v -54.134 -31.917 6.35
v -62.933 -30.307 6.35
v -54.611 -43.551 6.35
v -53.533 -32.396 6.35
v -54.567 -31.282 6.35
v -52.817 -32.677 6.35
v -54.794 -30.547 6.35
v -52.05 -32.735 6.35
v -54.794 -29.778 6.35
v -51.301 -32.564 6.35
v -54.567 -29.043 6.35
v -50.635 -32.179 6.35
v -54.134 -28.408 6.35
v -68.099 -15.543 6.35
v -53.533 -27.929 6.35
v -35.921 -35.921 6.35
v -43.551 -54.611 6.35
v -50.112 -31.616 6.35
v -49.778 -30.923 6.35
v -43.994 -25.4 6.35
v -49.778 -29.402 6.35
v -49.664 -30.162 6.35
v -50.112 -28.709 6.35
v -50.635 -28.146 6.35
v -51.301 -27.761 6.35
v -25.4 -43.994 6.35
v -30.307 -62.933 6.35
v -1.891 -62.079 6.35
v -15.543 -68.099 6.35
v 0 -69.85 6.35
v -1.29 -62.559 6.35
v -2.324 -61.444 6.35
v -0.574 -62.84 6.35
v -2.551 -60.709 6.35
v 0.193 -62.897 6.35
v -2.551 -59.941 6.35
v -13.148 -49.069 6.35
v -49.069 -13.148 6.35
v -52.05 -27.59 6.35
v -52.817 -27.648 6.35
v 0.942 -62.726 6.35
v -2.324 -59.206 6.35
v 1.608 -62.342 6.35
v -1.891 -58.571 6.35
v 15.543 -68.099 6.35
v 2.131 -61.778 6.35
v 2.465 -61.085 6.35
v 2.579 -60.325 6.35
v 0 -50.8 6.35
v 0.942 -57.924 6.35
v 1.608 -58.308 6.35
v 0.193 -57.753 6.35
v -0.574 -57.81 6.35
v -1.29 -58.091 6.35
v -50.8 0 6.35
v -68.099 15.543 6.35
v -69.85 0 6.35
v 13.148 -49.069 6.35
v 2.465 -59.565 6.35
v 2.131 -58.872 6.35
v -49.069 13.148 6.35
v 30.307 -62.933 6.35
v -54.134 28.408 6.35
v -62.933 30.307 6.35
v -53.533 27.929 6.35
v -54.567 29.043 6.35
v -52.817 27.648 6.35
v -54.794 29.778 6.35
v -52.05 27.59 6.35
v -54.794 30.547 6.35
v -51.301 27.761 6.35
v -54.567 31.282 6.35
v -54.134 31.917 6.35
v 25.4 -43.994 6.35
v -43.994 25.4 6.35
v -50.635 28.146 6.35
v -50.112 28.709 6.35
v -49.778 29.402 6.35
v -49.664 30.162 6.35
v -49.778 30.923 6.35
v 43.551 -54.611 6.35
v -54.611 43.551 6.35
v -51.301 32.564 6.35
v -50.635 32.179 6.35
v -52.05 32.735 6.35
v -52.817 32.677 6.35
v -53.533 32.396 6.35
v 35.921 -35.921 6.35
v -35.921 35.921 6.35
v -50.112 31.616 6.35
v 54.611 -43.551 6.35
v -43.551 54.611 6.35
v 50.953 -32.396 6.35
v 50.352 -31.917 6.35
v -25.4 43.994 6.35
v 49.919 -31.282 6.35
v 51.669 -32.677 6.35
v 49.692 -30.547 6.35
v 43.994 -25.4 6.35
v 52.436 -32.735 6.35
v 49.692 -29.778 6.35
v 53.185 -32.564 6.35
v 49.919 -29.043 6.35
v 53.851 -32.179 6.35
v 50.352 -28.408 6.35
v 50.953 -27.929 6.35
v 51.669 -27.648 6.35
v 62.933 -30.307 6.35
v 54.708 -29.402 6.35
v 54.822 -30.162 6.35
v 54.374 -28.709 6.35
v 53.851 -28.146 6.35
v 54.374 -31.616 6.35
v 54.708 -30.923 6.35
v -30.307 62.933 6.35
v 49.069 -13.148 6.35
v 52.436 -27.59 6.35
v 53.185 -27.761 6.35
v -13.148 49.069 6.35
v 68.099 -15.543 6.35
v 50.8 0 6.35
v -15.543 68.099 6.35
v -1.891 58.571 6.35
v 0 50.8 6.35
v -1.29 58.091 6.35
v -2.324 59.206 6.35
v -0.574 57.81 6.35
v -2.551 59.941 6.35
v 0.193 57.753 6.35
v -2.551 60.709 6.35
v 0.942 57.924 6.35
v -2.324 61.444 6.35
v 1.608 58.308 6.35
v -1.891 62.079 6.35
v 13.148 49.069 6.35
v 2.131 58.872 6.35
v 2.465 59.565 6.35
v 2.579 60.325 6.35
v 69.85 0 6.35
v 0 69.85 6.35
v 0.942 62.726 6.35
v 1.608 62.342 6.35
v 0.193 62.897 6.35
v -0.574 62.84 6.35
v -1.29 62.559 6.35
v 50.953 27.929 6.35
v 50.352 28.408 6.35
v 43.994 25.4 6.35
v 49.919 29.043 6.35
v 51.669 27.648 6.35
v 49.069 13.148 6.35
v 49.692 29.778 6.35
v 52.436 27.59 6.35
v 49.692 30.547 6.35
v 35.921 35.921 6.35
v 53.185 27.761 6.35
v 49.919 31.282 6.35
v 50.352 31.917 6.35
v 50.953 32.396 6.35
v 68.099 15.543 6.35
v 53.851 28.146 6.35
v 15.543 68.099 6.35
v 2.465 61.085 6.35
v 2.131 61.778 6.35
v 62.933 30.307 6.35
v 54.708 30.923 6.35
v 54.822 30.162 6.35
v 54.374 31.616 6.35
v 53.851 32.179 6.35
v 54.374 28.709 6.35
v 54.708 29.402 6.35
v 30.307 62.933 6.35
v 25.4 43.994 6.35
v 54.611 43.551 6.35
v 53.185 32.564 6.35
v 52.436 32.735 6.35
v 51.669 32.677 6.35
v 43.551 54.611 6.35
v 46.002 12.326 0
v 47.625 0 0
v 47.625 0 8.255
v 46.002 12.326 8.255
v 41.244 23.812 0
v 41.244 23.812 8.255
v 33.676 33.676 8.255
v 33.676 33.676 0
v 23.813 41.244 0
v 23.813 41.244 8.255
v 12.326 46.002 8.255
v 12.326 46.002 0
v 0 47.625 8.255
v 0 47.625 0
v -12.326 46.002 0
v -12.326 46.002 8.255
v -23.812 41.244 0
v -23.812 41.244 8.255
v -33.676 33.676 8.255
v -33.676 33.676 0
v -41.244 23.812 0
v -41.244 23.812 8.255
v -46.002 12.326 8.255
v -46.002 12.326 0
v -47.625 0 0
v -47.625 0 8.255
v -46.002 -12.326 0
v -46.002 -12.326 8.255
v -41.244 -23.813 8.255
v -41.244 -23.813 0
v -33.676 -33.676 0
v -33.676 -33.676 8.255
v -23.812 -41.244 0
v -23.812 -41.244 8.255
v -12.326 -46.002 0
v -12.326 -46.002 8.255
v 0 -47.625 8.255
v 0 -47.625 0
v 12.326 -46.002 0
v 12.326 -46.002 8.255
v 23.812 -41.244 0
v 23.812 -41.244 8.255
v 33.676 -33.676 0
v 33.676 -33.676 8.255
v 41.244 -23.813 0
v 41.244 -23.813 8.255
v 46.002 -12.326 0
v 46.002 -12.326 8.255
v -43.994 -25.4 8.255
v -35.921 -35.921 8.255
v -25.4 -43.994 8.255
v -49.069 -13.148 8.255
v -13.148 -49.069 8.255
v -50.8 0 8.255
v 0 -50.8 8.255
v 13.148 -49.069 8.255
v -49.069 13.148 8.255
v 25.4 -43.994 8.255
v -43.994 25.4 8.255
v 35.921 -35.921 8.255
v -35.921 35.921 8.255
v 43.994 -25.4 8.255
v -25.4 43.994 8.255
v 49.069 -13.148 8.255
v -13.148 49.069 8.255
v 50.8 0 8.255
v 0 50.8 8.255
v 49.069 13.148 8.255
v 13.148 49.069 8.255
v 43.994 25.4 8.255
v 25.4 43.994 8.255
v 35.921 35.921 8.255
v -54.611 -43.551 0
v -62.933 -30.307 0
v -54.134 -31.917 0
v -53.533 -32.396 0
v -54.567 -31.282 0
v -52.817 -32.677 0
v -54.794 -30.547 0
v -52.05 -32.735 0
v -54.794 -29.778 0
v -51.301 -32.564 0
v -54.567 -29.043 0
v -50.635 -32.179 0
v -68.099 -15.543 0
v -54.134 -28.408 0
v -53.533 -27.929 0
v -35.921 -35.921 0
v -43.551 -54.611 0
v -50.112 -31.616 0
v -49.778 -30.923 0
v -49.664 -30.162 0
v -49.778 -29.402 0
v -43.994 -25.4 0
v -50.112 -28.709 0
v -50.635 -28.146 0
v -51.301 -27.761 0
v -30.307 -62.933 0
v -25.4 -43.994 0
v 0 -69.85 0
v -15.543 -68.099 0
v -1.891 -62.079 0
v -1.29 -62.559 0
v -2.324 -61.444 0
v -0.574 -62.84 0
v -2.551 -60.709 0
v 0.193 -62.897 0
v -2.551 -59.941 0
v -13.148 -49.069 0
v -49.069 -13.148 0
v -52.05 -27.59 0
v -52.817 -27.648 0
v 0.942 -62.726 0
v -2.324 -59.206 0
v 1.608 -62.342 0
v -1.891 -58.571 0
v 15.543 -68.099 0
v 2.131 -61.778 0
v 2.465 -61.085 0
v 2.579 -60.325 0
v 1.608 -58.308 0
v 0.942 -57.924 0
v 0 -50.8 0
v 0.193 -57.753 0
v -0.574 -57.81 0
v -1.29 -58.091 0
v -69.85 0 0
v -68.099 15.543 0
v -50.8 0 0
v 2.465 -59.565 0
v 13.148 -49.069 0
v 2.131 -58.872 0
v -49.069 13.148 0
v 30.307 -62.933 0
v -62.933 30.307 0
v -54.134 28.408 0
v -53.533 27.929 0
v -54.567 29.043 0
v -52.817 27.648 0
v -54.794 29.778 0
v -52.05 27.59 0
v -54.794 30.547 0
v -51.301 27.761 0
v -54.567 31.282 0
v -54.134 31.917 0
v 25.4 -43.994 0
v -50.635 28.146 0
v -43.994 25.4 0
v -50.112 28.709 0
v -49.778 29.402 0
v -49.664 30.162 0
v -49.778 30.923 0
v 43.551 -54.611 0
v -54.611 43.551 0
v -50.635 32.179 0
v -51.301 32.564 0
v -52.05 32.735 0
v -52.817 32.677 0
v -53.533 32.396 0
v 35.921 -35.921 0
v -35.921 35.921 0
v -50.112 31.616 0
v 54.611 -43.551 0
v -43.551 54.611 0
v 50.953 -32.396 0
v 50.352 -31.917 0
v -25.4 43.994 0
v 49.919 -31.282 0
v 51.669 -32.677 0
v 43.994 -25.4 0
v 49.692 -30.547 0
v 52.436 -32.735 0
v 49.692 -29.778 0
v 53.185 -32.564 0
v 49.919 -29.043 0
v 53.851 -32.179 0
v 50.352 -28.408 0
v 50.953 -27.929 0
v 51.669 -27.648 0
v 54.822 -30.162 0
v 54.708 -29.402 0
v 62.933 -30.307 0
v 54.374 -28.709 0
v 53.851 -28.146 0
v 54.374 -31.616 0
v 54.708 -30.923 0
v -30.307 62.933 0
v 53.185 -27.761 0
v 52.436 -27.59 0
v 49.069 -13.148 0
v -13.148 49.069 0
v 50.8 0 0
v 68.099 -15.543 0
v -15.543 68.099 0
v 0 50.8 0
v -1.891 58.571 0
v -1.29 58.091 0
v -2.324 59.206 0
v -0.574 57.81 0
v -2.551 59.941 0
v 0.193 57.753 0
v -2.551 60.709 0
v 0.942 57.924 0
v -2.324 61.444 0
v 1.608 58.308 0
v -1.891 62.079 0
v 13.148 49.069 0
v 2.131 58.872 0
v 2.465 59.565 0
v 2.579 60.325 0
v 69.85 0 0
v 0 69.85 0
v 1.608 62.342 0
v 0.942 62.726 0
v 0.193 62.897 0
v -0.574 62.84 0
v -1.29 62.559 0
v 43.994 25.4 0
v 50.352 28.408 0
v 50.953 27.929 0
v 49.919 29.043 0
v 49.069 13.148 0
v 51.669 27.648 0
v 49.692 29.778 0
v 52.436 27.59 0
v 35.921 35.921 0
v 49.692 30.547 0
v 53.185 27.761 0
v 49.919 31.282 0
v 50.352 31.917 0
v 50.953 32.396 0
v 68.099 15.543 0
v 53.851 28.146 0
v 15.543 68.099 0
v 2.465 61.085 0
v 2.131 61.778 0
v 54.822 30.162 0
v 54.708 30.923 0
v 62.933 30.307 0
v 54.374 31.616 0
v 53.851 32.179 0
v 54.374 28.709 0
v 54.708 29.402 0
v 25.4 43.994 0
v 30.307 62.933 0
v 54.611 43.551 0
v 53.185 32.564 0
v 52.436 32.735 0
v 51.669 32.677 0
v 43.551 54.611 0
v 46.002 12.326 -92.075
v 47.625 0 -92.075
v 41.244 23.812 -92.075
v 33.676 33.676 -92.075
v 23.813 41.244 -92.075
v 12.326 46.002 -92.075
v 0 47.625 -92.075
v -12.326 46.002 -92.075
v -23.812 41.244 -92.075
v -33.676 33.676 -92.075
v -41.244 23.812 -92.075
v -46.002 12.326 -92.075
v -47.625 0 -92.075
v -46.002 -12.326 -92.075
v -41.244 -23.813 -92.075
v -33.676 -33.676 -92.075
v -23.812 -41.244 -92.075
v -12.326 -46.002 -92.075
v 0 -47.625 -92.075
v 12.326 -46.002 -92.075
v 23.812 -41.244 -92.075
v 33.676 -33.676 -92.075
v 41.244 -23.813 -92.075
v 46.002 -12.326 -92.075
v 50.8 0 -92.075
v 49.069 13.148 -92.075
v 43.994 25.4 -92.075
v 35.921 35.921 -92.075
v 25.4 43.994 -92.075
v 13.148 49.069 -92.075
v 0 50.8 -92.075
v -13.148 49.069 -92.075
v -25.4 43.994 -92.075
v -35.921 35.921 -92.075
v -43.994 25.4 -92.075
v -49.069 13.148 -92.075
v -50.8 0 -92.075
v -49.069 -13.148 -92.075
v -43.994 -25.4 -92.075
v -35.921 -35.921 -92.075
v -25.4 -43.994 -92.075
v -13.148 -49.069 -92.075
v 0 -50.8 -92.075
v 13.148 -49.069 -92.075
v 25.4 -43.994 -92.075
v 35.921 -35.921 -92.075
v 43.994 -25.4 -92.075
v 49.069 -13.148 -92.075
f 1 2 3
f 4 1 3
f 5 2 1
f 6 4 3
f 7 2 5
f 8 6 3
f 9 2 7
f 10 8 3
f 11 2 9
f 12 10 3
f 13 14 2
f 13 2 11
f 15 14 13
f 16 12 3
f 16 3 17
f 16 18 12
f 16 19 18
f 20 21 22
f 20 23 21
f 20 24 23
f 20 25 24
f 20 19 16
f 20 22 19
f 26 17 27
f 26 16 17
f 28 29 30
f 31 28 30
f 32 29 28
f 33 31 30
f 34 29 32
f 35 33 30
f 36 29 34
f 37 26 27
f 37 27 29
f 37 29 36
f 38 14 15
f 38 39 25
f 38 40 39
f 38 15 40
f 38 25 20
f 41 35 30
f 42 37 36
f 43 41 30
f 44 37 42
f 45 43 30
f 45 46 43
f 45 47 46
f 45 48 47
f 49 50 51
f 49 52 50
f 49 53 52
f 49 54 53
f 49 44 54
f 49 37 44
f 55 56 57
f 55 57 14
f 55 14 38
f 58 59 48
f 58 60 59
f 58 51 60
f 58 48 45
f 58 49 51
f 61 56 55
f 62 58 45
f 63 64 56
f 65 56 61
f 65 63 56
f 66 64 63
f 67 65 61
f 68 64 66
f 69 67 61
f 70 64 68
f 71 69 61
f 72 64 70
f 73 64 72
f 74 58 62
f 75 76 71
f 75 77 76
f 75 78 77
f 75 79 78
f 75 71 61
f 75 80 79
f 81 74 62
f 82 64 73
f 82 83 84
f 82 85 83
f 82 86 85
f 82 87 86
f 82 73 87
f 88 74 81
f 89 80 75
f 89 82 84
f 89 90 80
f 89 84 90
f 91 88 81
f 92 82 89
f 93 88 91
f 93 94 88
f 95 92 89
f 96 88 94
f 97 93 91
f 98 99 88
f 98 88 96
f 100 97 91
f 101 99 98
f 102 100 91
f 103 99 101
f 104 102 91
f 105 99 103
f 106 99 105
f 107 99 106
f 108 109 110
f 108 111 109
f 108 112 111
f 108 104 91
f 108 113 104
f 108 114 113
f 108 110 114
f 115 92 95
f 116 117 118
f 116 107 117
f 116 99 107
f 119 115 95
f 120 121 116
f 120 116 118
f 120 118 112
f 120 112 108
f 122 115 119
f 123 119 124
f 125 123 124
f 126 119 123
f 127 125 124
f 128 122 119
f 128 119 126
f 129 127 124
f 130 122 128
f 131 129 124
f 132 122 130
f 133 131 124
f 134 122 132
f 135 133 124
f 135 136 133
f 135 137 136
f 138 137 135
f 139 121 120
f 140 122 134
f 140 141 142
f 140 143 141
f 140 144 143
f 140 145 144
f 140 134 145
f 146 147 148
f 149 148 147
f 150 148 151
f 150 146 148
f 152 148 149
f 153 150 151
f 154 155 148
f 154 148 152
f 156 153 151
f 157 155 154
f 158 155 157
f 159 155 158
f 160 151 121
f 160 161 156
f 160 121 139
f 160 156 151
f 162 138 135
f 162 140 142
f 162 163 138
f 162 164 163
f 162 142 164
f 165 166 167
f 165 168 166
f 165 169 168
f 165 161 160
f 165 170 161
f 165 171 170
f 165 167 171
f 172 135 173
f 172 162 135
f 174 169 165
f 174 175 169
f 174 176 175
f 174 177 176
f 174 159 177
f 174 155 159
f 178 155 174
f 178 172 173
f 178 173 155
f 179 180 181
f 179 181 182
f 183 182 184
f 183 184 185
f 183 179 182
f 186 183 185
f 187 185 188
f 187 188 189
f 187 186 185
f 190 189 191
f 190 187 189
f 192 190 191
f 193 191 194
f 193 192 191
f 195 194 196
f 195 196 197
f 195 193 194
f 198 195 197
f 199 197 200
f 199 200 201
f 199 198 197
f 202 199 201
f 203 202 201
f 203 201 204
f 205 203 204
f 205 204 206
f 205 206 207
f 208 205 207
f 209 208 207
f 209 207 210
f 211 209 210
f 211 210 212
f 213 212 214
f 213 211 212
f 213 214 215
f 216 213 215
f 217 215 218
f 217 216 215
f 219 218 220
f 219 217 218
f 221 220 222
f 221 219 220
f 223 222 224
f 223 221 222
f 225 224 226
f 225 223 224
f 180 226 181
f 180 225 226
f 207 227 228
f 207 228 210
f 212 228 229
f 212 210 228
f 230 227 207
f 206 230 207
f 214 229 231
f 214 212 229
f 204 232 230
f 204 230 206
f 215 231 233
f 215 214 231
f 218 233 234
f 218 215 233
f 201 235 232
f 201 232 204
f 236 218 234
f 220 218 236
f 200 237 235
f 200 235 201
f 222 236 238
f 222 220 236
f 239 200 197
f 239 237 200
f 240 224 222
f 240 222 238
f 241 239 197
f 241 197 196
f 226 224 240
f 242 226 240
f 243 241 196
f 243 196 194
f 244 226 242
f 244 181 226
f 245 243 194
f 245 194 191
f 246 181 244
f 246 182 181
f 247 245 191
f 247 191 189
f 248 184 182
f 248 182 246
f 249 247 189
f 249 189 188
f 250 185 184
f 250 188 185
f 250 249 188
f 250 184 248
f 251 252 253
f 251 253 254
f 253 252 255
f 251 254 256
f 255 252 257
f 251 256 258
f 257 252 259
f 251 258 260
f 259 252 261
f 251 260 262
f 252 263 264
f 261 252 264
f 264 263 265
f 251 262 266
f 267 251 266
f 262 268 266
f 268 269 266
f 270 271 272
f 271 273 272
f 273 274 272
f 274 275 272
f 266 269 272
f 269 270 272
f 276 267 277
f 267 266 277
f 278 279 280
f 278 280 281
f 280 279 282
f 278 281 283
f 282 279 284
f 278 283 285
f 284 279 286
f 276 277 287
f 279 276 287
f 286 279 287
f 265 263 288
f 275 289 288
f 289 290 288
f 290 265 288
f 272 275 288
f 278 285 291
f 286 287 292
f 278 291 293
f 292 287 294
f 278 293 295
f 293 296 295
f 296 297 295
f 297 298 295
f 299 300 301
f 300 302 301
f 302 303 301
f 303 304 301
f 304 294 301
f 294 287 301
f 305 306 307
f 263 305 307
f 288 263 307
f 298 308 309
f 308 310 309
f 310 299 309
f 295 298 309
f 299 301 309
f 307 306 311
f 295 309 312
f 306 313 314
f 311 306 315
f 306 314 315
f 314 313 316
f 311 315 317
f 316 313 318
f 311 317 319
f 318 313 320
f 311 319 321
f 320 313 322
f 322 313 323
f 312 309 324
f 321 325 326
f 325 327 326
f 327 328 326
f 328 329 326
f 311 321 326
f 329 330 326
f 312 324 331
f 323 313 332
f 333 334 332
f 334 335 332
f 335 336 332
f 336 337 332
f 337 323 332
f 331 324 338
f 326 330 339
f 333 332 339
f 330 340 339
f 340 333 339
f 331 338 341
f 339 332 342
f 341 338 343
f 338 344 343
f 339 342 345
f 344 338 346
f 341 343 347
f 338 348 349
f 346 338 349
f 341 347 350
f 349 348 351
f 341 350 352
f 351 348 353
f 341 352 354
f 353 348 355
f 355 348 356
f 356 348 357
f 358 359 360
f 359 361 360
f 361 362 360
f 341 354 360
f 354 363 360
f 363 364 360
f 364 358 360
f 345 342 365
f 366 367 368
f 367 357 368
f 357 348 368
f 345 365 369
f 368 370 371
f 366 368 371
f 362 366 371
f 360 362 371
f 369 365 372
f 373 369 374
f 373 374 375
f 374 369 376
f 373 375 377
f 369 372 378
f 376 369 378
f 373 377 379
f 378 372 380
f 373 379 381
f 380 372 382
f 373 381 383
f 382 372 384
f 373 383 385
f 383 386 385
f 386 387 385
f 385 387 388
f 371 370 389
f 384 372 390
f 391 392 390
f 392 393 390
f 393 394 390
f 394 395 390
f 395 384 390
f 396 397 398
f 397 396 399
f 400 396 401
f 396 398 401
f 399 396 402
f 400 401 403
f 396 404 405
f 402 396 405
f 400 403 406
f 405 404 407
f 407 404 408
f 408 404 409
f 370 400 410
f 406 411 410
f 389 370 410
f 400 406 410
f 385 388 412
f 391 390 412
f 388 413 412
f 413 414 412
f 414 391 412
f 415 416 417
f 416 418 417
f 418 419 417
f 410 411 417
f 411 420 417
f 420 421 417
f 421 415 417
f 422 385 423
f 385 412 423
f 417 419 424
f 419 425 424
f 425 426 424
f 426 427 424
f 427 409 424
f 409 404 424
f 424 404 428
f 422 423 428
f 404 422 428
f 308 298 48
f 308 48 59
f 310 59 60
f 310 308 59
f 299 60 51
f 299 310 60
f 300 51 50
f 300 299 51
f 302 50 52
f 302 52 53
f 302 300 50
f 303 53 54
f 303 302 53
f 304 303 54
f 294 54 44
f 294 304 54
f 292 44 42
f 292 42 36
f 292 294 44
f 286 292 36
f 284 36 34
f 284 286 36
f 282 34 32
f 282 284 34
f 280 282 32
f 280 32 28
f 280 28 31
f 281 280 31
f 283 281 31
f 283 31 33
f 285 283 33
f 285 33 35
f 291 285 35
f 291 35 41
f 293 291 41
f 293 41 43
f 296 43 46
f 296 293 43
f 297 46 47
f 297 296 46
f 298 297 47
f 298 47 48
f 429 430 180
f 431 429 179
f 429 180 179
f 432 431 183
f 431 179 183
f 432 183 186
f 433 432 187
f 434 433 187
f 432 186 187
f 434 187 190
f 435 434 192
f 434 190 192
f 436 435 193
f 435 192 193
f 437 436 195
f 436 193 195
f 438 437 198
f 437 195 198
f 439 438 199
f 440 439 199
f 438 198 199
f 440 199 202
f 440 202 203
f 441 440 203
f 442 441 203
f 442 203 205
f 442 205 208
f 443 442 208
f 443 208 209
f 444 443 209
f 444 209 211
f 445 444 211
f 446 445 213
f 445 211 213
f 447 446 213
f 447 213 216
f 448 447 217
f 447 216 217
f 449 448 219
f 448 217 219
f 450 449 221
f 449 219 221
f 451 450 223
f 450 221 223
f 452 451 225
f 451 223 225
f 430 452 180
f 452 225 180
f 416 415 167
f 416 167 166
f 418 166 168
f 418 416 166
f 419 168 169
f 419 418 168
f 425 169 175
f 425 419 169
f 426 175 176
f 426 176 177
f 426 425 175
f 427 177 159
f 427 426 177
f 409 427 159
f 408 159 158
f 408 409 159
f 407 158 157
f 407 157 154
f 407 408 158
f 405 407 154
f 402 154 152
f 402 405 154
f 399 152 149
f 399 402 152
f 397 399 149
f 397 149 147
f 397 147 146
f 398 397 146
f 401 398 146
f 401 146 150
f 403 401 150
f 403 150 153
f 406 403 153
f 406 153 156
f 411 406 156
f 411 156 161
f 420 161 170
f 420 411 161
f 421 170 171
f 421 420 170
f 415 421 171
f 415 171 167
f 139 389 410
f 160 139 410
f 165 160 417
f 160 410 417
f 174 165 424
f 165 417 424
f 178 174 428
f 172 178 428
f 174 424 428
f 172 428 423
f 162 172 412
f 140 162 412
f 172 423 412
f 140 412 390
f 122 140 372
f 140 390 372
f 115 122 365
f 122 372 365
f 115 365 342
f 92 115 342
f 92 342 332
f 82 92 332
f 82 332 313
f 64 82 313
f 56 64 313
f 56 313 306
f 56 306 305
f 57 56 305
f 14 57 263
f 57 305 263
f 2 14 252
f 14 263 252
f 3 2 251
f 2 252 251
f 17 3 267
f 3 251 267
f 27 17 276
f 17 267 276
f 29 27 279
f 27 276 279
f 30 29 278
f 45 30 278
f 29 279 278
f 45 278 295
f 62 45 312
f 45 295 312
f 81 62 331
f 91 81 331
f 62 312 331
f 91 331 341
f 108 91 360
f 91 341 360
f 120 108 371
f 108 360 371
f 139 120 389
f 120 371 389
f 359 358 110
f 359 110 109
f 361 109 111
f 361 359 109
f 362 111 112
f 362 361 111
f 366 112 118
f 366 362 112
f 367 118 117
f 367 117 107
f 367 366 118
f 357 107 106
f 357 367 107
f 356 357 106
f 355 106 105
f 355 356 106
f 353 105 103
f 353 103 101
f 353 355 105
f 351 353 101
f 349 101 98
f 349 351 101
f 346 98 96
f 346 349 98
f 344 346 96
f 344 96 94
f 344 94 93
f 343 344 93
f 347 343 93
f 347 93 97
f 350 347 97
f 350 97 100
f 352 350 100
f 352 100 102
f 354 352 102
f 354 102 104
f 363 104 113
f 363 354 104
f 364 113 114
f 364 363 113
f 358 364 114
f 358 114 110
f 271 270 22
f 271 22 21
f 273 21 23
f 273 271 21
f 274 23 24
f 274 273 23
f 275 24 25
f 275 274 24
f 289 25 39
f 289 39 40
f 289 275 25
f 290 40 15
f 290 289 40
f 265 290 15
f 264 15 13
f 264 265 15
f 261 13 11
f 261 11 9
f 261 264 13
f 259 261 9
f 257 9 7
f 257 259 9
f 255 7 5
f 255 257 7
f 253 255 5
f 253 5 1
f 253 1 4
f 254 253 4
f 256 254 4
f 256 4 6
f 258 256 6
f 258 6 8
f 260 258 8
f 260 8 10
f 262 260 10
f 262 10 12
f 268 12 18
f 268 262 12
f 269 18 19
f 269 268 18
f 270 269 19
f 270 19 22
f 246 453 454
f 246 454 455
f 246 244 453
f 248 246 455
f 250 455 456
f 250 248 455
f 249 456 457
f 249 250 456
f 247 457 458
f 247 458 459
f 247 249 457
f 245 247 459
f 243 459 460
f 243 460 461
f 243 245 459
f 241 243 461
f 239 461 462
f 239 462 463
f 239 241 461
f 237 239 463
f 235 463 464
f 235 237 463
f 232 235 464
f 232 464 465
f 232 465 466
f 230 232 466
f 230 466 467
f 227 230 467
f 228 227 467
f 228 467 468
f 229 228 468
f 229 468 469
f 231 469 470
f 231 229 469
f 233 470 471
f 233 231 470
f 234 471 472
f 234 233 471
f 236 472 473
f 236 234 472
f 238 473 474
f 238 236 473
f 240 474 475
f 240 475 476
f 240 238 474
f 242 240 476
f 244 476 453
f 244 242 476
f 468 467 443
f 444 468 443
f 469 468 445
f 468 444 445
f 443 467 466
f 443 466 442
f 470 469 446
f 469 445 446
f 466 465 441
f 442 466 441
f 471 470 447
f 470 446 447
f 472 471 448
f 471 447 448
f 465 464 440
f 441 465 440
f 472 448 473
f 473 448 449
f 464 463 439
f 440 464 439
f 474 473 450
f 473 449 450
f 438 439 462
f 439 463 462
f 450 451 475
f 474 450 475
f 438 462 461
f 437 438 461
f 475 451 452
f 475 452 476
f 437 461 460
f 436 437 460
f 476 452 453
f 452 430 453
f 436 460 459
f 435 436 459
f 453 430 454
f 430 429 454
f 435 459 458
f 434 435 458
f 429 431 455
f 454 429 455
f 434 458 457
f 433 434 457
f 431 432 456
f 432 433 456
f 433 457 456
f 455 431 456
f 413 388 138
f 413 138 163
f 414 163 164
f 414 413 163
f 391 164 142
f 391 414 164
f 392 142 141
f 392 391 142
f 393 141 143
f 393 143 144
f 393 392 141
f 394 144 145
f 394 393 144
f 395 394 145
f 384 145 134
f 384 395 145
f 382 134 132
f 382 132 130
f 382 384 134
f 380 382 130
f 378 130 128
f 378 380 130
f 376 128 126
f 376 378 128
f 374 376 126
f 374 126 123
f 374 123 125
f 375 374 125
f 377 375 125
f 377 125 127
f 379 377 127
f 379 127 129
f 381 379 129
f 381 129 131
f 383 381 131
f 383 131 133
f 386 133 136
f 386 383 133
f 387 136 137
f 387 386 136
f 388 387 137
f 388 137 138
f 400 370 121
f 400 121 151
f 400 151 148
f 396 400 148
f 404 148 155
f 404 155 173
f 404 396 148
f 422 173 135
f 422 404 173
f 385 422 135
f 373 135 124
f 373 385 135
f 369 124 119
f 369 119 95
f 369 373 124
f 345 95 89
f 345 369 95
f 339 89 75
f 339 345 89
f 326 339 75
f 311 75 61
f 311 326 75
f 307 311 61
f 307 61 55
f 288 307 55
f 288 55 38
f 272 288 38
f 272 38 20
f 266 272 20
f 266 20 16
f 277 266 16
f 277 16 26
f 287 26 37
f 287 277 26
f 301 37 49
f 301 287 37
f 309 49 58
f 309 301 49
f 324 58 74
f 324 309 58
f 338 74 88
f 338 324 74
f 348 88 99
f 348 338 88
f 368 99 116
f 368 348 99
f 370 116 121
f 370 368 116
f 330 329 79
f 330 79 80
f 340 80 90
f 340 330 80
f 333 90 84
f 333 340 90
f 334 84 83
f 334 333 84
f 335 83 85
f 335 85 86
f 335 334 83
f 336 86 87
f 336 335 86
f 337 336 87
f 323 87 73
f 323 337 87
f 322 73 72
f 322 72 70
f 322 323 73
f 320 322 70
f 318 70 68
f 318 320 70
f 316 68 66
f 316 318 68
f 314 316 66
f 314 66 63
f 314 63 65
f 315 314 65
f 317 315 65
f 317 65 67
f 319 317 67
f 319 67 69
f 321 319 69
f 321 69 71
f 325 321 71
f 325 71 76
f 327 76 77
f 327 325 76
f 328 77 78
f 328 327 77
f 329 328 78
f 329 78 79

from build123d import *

# Parameters (mm, degrees)
SKETCH1_R           = 69.85
SKETCH1_R_2         = 50.8
SKETCH1_R_3         = 2.57937
EXTRUDE1_DEPTH      = 6.35
SKETCH2_R           = 50.8
SKETCH2_R_2         = 47.625
EXTRUDE2_DEPTH      = 8.255
EXTRUDE2_DEPTH_BACK = 92.075


with BuildPart() as part:
    # Sketch1 → Extrude1 (new body)
    with BuildSketch(Plane.XY):
        Circle(SKETCH1_R)
        Circle(SKETCH1_R_2, mode=Mode.SUBTRACT)
        with Locations((0, 60.325)):
            Circle(SKETCH1_R_3, mode=Mode.SUBTRACT)
        with Locations((-52.242982483, 30.1625)):
            Circle(SKETCH1_R_3, mode=Mode.SUBTRACT)
        with Locations((-52.242982483, -30.1625)):
            Circle(SKETCH1_R_3, mode=Mode.SUBTRACT)
        with Locations((0, -60.325)):
            Circle(SKETCH1_R_3, mode=Mode.SUBTRACT)
        with Locations((52.242982483, -30.1625)):
            Circle(SKETCH1_R_3, mode=Mode.SUBTRACT)
        with Locations((52.242982483, 30.1625)):
            Circle(SKETCH1_R_3, mode=Mode.SUBTRACT)
    extrude(amount=EXTRUDE1_DEPTH)


with BuildPart() as body_2:
    # Sketch2 → Extrude2 (new body, two sides)
    with BuildSketch(Plane.XY) as extrude2_sk:
        Circle(SKETCH2_R)
        Circle(SKETCH2_R_2, mode=Mode.SUBTRACT)
    extrude(amount=EXTRUDE2_DEPTH)
    extrude(extrude2_sk.sketch, amount=-EXTRUDE2_DEPTH_BACK)


solid = Compound([part.part, body_2.part])
